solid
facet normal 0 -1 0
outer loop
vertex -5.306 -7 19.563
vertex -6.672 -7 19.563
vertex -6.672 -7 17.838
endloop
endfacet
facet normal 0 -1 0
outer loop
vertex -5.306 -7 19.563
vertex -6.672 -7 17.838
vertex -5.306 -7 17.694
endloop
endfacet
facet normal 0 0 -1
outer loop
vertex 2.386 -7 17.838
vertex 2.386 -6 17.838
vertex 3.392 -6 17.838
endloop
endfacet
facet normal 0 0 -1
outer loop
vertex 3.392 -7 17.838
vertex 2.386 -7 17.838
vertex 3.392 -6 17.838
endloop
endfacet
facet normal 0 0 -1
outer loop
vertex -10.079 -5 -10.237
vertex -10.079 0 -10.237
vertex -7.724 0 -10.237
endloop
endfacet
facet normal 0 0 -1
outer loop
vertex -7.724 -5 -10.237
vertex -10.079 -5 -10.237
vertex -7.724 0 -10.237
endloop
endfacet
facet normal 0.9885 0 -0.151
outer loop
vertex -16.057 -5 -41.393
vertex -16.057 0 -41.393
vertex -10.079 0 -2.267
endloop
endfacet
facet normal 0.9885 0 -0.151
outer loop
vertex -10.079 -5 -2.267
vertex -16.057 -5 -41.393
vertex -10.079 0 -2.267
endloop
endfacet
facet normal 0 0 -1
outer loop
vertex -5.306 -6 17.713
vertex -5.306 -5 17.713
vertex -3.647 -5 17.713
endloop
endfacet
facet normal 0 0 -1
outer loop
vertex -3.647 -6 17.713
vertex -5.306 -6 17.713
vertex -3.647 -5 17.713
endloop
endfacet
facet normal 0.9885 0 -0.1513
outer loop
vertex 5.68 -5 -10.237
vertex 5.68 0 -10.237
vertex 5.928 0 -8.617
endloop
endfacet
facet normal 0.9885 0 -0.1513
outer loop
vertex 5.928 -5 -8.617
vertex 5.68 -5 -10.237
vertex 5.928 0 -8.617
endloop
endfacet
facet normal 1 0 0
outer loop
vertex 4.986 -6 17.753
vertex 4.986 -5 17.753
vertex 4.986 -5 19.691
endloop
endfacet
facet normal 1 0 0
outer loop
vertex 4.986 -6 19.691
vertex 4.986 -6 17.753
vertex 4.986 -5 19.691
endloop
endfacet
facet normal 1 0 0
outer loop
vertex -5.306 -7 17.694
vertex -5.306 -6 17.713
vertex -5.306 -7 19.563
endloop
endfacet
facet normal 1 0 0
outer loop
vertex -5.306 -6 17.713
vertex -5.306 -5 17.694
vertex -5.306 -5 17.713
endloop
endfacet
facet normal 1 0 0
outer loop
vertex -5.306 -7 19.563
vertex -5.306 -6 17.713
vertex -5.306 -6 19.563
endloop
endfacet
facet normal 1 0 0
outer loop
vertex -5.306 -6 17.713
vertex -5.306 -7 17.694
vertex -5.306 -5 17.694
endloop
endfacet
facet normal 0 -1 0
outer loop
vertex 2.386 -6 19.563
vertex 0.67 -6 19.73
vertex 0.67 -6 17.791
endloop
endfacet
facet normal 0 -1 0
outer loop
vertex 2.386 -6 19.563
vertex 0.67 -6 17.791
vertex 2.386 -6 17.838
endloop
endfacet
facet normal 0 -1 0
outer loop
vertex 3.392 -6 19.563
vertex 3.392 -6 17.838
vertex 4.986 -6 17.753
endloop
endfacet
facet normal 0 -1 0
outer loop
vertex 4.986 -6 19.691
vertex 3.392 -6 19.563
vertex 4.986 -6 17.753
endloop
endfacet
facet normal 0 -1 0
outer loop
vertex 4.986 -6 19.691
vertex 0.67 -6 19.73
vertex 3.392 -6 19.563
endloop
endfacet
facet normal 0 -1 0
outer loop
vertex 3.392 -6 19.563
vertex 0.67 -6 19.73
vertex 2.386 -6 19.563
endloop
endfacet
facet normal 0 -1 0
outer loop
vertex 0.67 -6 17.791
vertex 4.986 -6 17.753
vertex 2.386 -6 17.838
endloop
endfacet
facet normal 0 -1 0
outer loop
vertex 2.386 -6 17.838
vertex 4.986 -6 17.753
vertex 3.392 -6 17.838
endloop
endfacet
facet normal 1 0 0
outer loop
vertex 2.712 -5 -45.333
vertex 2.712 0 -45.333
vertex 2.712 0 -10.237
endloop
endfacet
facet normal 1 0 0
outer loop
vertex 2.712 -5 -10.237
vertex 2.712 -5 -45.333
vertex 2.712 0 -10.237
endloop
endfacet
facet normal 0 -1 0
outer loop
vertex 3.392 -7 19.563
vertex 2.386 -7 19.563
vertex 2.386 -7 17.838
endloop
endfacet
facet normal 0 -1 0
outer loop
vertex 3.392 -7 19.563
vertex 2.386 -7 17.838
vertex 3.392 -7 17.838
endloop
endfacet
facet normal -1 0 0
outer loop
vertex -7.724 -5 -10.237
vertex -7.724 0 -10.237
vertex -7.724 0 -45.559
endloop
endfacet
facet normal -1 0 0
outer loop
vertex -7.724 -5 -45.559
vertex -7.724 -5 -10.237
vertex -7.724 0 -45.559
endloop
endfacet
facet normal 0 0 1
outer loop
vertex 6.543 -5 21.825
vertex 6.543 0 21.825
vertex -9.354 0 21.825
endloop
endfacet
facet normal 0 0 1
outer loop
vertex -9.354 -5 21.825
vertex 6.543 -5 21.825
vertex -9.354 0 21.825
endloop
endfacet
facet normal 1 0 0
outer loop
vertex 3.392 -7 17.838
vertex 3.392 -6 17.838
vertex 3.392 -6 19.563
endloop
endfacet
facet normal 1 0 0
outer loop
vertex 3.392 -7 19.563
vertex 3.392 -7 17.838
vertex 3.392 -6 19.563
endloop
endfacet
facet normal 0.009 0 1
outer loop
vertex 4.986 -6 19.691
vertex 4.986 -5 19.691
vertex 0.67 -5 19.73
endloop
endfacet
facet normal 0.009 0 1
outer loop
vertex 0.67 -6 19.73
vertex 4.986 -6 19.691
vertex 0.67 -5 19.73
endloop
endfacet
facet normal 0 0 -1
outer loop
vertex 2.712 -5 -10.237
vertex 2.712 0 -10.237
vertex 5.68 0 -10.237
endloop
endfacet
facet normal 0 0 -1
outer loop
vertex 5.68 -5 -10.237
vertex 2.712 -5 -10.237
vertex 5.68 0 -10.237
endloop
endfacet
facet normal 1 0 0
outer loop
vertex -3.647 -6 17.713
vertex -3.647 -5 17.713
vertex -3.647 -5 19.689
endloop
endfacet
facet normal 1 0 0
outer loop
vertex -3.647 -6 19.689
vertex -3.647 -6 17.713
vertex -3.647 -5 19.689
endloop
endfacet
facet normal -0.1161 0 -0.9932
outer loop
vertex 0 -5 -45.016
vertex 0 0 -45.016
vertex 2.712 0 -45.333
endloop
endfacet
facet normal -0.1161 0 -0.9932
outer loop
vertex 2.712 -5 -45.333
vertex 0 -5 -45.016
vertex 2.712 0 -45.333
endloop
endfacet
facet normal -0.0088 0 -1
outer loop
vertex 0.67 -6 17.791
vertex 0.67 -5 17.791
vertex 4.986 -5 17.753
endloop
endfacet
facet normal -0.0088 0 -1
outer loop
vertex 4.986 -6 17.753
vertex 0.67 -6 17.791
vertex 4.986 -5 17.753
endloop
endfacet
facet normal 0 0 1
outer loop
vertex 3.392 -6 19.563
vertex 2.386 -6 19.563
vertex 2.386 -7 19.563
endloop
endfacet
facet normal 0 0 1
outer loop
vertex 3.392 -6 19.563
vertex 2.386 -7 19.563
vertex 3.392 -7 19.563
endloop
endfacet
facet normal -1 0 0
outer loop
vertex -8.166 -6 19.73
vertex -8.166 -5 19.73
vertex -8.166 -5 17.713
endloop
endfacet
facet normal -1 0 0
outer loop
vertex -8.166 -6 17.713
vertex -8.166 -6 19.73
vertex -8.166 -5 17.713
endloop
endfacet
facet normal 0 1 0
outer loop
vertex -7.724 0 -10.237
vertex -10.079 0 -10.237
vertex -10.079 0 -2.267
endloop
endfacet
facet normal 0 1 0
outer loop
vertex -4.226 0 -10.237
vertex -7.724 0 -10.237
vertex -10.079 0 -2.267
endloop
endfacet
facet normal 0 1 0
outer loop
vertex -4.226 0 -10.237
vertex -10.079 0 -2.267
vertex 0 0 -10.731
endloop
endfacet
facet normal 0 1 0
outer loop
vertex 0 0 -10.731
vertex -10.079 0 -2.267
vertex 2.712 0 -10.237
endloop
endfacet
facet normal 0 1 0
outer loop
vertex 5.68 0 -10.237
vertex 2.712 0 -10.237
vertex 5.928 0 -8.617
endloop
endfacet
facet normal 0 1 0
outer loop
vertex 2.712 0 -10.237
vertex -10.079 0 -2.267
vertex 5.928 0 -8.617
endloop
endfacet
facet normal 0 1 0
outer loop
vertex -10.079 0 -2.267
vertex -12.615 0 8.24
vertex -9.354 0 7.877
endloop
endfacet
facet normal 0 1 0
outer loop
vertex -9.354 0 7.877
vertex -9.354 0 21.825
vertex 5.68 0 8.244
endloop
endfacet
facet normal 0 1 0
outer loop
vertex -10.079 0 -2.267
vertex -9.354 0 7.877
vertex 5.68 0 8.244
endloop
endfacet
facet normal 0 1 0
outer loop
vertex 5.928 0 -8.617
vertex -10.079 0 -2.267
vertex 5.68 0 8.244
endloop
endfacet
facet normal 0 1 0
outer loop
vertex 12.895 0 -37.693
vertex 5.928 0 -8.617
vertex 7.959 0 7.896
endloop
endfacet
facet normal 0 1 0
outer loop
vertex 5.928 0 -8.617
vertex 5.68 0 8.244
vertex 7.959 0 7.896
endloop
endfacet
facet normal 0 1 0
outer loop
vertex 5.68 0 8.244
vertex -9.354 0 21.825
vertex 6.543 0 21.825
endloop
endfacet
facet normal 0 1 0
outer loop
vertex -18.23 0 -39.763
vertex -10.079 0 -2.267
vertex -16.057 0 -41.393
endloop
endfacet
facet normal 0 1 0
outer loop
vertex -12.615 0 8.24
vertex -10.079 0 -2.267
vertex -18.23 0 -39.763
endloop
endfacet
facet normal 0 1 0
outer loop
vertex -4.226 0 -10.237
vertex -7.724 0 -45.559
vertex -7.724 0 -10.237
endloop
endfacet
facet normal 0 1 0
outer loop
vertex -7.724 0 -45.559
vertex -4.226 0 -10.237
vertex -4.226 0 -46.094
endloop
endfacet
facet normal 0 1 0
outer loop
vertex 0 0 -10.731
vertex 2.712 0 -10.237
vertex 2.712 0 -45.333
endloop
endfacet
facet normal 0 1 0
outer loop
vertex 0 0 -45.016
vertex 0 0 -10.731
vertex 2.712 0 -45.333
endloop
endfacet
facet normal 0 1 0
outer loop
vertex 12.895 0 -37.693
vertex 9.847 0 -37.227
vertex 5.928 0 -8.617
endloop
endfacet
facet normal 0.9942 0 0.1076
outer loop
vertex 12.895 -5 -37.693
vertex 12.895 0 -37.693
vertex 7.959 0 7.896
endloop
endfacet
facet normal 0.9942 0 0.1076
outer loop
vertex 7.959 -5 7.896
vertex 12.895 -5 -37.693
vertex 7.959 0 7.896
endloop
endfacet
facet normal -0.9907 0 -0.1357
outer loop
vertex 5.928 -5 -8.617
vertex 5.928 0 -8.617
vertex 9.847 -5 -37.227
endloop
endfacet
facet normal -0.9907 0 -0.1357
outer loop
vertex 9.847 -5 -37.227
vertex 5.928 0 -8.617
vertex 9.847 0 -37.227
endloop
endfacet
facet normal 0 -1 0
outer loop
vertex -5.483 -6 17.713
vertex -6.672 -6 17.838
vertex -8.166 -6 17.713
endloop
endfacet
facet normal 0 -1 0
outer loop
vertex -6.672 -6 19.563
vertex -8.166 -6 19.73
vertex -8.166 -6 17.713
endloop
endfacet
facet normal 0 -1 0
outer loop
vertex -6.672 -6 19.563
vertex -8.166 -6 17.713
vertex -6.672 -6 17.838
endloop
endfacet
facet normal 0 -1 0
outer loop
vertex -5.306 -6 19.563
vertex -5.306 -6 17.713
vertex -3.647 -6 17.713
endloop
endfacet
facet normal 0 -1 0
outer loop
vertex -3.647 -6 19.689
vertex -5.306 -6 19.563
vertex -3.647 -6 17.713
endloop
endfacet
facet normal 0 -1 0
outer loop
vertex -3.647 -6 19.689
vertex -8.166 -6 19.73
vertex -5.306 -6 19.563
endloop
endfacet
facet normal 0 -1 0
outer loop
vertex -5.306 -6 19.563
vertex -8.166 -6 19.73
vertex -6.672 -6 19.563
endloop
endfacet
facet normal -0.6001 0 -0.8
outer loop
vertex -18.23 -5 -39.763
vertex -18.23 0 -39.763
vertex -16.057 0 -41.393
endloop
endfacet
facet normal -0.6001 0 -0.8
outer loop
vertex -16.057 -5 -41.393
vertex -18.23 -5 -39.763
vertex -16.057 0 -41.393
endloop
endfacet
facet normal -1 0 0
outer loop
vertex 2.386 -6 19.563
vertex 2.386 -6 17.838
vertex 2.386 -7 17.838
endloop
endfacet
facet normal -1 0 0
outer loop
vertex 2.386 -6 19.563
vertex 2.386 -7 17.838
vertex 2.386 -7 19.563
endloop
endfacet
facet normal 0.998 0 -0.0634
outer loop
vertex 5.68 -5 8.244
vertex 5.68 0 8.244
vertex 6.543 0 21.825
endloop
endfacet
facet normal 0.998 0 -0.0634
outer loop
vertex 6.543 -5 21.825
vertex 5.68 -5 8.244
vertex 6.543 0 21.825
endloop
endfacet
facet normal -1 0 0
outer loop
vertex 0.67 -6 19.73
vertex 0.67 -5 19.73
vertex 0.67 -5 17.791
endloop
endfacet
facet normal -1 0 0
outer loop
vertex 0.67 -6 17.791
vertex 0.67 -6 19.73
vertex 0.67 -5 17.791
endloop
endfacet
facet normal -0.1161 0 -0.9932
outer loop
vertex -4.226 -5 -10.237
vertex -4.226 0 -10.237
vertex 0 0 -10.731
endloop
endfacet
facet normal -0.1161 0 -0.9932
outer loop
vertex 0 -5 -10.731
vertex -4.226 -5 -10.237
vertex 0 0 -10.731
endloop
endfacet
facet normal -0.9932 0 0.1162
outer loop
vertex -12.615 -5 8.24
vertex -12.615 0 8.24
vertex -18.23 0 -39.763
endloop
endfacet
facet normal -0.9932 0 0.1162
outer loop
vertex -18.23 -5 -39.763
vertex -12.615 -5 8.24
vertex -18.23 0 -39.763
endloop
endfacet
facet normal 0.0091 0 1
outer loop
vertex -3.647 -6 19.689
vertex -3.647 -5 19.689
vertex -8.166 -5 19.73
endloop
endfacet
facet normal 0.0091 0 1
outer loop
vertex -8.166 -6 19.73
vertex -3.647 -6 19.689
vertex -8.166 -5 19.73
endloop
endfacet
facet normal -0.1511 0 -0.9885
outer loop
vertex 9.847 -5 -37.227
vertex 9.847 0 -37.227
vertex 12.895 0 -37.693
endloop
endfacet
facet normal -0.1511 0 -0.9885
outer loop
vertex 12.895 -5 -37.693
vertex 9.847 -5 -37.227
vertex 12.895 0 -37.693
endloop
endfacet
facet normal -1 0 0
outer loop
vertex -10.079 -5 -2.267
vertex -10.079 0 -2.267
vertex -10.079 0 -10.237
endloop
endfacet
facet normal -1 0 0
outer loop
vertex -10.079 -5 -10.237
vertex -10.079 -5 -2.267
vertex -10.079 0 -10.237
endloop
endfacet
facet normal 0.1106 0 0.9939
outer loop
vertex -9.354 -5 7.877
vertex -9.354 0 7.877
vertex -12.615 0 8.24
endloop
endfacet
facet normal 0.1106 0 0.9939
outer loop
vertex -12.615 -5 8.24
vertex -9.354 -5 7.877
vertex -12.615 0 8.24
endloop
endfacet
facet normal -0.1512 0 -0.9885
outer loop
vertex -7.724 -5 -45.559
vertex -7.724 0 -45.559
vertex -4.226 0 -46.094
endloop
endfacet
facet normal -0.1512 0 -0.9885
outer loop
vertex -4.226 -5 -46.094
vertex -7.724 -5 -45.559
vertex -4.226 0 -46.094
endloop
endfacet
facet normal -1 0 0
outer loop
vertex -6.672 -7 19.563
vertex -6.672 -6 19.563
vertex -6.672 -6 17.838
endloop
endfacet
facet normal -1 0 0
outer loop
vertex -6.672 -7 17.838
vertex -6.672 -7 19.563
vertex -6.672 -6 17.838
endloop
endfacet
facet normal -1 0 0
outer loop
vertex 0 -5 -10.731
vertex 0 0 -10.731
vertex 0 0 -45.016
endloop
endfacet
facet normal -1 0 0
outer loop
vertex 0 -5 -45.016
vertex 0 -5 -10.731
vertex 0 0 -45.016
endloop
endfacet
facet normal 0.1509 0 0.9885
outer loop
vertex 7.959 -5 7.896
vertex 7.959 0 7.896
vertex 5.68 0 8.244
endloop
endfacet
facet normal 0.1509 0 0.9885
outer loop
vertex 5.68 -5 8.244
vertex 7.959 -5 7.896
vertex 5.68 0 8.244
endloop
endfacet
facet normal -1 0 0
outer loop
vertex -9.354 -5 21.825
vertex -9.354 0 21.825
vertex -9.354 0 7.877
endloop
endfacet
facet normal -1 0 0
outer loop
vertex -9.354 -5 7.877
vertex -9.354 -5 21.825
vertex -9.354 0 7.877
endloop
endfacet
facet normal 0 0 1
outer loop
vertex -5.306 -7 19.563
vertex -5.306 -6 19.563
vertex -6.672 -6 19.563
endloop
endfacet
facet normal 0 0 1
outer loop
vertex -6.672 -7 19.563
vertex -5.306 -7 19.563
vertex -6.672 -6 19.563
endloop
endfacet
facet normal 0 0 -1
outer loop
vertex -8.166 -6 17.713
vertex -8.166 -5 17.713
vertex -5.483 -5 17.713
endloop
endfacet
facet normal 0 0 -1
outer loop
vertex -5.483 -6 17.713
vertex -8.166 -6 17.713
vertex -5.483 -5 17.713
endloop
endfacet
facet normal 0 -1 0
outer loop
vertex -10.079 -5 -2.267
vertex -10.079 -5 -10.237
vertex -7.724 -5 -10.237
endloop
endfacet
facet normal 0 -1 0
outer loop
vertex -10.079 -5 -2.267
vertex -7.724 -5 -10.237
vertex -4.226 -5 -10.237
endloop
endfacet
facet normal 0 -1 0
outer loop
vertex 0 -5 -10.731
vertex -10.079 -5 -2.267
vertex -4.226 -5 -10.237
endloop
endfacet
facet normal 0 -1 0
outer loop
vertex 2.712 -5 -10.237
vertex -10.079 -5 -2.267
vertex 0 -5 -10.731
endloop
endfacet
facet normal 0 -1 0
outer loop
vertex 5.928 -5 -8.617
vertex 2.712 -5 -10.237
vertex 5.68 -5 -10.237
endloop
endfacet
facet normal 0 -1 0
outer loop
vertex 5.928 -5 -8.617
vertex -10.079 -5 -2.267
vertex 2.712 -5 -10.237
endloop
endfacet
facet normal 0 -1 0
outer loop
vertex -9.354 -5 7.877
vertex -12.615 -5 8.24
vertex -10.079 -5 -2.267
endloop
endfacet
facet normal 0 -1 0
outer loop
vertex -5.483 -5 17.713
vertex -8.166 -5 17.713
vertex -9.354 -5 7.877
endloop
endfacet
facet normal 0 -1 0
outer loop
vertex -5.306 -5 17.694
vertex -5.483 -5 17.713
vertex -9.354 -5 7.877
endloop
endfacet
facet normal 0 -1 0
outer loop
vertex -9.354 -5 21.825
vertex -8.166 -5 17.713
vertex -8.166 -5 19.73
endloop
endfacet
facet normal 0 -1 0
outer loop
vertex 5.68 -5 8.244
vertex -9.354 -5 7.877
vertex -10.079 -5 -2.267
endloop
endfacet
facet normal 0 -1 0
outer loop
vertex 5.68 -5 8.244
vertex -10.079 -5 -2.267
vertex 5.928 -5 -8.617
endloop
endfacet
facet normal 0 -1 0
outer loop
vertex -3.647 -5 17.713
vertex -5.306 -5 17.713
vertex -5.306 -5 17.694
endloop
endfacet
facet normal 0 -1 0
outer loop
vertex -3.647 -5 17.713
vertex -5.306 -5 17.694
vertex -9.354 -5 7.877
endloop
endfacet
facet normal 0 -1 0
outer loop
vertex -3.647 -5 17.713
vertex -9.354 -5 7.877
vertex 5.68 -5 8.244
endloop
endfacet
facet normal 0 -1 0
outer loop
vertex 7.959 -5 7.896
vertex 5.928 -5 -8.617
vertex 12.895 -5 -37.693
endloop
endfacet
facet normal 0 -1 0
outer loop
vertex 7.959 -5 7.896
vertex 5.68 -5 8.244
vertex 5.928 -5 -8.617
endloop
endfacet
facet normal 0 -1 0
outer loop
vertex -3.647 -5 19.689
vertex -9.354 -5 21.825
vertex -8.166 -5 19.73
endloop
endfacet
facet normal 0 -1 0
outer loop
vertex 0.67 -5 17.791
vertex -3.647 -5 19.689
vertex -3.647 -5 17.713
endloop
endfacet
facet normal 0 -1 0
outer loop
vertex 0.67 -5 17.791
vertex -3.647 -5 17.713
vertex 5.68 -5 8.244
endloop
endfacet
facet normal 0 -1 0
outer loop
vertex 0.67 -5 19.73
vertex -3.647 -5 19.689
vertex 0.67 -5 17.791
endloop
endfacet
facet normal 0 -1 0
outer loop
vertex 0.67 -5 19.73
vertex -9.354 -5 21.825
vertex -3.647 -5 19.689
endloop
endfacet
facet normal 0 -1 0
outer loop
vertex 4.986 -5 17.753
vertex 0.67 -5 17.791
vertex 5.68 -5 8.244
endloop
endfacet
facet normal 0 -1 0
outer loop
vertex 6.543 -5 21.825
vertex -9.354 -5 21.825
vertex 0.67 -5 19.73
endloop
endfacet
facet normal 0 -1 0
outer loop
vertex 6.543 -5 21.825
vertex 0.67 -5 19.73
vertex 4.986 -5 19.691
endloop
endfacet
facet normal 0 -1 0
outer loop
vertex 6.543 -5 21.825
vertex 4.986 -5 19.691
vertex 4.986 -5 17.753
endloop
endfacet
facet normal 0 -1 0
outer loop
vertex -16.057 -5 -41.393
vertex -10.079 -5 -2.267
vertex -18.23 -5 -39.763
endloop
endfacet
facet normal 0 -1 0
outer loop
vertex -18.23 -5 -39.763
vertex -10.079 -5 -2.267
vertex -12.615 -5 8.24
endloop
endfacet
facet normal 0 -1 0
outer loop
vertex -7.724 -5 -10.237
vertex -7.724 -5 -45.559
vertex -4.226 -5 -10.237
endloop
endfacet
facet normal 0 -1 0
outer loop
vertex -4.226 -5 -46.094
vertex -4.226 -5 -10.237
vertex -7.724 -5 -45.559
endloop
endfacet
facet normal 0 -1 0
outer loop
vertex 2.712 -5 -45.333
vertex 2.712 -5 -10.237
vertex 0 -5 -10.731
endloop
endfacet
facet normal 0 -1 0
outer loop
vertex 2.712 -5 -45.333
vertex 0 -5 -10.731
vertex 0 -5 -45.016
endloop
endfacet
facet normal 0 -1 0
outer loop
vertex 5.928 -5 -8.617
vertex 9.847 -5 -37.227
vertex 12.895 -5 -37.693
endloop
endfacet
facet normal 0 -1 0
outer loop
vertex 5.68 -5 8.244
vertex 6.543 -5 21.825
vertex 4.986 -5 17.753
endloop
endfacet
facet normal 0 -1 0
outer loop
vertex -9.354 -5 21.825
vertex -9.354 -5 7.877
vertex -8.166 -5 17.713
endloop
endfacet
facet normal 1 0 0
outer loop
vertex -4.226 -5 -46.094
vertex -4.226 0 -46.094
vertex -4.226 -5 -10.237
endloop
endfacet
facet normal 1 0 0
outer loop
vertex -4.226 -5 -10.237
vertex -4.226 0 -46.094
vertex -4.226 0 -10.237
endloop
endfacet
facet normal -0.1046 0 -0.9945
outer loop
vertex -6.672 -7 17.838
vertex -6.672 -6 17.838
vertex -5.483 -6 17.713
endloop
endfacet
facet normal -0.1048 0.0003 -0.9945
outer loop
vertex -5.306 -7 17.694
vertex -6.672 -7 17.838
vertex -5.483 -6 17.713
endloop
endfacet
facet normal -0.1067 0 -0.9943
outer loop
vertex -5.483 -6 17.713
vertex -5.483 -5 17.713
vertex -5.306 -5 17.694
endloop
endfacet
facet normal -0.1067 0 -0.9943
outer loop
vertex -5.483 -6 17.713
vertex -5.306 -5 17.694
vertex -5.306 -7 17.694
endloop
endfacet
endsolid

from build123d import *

# Parameters (mm, degrees)
F1_DEPTH = 5
F3_DEPTH = 6
F4_W     = 1.006404
F4_H     = 1.725264
F5_DEPTH = 7


with BuildPart() as f1:
    # F0 (on Front) → F1 (new body)
    with BuildSketch(Plane.XZ):
        Polygon((-9.354408, 7.877359), (-12.614951, 8.239642), (-18.230332, -39.76281), (-16.056636, -41.393083), (-10.078973, -2.266556), (-10.078973, -10.236774), (-7.724135, -10.236774), (-4.225735, -10.236774), (2.712137, -10.236774), (5.680322, -10.236774), (5.927842, -8.616642), (9.846571, -37.22683), (12.894985, -37.692559), (7.959375, 7.895558), (5.680322, 8.243747), (6.543175, 21.825243), (-9.354408, 21.825243), align=None)
        Polygon((-4.225735, -10.236774), (-7.724135, -10.236774), (-7.724135, -45.559332), (-4.225735, -46.09381), align=None)
        Polygon((2.712137, -10.236774), (-4.225735, -10.236774), (0, -10.731105), (0, -45.015905), (2.712137, -45.333174), align=None)
    extrude(amount=F1_DEPTH)

    # F2 (on Front) → F3 (join)
    with BuildSketch(Plane.XZ):
        Polygon((-3.647329, 19.689403), (-8.165929, 19.729748), (-8.165929, 17.712517), (-3.647329, 17.712517), align=None)
        Polygon((4.986425, 17.752862), (4.986425, 19.366648), (4.986425, 19.691204), (0.669532, 19.729748), (0.669532, 17.791406), align=None)
    extrude(amount=F3_DEPTH)

    # F4 (on Front) → F5 (join)
    with BuildSketch(Plane.XZ):
        Polygon((-6.671616, 19.56287), (-6.671616, 17.837606), (-5.305782, 17.693834), (-5.305782, 19.56287), align=None)
        with Locations((2.889219, 18.700238)):
            Rectangle(F4_W, F4_H)
    extrude(amount=F5_DEPTH)


solid = f1.part
